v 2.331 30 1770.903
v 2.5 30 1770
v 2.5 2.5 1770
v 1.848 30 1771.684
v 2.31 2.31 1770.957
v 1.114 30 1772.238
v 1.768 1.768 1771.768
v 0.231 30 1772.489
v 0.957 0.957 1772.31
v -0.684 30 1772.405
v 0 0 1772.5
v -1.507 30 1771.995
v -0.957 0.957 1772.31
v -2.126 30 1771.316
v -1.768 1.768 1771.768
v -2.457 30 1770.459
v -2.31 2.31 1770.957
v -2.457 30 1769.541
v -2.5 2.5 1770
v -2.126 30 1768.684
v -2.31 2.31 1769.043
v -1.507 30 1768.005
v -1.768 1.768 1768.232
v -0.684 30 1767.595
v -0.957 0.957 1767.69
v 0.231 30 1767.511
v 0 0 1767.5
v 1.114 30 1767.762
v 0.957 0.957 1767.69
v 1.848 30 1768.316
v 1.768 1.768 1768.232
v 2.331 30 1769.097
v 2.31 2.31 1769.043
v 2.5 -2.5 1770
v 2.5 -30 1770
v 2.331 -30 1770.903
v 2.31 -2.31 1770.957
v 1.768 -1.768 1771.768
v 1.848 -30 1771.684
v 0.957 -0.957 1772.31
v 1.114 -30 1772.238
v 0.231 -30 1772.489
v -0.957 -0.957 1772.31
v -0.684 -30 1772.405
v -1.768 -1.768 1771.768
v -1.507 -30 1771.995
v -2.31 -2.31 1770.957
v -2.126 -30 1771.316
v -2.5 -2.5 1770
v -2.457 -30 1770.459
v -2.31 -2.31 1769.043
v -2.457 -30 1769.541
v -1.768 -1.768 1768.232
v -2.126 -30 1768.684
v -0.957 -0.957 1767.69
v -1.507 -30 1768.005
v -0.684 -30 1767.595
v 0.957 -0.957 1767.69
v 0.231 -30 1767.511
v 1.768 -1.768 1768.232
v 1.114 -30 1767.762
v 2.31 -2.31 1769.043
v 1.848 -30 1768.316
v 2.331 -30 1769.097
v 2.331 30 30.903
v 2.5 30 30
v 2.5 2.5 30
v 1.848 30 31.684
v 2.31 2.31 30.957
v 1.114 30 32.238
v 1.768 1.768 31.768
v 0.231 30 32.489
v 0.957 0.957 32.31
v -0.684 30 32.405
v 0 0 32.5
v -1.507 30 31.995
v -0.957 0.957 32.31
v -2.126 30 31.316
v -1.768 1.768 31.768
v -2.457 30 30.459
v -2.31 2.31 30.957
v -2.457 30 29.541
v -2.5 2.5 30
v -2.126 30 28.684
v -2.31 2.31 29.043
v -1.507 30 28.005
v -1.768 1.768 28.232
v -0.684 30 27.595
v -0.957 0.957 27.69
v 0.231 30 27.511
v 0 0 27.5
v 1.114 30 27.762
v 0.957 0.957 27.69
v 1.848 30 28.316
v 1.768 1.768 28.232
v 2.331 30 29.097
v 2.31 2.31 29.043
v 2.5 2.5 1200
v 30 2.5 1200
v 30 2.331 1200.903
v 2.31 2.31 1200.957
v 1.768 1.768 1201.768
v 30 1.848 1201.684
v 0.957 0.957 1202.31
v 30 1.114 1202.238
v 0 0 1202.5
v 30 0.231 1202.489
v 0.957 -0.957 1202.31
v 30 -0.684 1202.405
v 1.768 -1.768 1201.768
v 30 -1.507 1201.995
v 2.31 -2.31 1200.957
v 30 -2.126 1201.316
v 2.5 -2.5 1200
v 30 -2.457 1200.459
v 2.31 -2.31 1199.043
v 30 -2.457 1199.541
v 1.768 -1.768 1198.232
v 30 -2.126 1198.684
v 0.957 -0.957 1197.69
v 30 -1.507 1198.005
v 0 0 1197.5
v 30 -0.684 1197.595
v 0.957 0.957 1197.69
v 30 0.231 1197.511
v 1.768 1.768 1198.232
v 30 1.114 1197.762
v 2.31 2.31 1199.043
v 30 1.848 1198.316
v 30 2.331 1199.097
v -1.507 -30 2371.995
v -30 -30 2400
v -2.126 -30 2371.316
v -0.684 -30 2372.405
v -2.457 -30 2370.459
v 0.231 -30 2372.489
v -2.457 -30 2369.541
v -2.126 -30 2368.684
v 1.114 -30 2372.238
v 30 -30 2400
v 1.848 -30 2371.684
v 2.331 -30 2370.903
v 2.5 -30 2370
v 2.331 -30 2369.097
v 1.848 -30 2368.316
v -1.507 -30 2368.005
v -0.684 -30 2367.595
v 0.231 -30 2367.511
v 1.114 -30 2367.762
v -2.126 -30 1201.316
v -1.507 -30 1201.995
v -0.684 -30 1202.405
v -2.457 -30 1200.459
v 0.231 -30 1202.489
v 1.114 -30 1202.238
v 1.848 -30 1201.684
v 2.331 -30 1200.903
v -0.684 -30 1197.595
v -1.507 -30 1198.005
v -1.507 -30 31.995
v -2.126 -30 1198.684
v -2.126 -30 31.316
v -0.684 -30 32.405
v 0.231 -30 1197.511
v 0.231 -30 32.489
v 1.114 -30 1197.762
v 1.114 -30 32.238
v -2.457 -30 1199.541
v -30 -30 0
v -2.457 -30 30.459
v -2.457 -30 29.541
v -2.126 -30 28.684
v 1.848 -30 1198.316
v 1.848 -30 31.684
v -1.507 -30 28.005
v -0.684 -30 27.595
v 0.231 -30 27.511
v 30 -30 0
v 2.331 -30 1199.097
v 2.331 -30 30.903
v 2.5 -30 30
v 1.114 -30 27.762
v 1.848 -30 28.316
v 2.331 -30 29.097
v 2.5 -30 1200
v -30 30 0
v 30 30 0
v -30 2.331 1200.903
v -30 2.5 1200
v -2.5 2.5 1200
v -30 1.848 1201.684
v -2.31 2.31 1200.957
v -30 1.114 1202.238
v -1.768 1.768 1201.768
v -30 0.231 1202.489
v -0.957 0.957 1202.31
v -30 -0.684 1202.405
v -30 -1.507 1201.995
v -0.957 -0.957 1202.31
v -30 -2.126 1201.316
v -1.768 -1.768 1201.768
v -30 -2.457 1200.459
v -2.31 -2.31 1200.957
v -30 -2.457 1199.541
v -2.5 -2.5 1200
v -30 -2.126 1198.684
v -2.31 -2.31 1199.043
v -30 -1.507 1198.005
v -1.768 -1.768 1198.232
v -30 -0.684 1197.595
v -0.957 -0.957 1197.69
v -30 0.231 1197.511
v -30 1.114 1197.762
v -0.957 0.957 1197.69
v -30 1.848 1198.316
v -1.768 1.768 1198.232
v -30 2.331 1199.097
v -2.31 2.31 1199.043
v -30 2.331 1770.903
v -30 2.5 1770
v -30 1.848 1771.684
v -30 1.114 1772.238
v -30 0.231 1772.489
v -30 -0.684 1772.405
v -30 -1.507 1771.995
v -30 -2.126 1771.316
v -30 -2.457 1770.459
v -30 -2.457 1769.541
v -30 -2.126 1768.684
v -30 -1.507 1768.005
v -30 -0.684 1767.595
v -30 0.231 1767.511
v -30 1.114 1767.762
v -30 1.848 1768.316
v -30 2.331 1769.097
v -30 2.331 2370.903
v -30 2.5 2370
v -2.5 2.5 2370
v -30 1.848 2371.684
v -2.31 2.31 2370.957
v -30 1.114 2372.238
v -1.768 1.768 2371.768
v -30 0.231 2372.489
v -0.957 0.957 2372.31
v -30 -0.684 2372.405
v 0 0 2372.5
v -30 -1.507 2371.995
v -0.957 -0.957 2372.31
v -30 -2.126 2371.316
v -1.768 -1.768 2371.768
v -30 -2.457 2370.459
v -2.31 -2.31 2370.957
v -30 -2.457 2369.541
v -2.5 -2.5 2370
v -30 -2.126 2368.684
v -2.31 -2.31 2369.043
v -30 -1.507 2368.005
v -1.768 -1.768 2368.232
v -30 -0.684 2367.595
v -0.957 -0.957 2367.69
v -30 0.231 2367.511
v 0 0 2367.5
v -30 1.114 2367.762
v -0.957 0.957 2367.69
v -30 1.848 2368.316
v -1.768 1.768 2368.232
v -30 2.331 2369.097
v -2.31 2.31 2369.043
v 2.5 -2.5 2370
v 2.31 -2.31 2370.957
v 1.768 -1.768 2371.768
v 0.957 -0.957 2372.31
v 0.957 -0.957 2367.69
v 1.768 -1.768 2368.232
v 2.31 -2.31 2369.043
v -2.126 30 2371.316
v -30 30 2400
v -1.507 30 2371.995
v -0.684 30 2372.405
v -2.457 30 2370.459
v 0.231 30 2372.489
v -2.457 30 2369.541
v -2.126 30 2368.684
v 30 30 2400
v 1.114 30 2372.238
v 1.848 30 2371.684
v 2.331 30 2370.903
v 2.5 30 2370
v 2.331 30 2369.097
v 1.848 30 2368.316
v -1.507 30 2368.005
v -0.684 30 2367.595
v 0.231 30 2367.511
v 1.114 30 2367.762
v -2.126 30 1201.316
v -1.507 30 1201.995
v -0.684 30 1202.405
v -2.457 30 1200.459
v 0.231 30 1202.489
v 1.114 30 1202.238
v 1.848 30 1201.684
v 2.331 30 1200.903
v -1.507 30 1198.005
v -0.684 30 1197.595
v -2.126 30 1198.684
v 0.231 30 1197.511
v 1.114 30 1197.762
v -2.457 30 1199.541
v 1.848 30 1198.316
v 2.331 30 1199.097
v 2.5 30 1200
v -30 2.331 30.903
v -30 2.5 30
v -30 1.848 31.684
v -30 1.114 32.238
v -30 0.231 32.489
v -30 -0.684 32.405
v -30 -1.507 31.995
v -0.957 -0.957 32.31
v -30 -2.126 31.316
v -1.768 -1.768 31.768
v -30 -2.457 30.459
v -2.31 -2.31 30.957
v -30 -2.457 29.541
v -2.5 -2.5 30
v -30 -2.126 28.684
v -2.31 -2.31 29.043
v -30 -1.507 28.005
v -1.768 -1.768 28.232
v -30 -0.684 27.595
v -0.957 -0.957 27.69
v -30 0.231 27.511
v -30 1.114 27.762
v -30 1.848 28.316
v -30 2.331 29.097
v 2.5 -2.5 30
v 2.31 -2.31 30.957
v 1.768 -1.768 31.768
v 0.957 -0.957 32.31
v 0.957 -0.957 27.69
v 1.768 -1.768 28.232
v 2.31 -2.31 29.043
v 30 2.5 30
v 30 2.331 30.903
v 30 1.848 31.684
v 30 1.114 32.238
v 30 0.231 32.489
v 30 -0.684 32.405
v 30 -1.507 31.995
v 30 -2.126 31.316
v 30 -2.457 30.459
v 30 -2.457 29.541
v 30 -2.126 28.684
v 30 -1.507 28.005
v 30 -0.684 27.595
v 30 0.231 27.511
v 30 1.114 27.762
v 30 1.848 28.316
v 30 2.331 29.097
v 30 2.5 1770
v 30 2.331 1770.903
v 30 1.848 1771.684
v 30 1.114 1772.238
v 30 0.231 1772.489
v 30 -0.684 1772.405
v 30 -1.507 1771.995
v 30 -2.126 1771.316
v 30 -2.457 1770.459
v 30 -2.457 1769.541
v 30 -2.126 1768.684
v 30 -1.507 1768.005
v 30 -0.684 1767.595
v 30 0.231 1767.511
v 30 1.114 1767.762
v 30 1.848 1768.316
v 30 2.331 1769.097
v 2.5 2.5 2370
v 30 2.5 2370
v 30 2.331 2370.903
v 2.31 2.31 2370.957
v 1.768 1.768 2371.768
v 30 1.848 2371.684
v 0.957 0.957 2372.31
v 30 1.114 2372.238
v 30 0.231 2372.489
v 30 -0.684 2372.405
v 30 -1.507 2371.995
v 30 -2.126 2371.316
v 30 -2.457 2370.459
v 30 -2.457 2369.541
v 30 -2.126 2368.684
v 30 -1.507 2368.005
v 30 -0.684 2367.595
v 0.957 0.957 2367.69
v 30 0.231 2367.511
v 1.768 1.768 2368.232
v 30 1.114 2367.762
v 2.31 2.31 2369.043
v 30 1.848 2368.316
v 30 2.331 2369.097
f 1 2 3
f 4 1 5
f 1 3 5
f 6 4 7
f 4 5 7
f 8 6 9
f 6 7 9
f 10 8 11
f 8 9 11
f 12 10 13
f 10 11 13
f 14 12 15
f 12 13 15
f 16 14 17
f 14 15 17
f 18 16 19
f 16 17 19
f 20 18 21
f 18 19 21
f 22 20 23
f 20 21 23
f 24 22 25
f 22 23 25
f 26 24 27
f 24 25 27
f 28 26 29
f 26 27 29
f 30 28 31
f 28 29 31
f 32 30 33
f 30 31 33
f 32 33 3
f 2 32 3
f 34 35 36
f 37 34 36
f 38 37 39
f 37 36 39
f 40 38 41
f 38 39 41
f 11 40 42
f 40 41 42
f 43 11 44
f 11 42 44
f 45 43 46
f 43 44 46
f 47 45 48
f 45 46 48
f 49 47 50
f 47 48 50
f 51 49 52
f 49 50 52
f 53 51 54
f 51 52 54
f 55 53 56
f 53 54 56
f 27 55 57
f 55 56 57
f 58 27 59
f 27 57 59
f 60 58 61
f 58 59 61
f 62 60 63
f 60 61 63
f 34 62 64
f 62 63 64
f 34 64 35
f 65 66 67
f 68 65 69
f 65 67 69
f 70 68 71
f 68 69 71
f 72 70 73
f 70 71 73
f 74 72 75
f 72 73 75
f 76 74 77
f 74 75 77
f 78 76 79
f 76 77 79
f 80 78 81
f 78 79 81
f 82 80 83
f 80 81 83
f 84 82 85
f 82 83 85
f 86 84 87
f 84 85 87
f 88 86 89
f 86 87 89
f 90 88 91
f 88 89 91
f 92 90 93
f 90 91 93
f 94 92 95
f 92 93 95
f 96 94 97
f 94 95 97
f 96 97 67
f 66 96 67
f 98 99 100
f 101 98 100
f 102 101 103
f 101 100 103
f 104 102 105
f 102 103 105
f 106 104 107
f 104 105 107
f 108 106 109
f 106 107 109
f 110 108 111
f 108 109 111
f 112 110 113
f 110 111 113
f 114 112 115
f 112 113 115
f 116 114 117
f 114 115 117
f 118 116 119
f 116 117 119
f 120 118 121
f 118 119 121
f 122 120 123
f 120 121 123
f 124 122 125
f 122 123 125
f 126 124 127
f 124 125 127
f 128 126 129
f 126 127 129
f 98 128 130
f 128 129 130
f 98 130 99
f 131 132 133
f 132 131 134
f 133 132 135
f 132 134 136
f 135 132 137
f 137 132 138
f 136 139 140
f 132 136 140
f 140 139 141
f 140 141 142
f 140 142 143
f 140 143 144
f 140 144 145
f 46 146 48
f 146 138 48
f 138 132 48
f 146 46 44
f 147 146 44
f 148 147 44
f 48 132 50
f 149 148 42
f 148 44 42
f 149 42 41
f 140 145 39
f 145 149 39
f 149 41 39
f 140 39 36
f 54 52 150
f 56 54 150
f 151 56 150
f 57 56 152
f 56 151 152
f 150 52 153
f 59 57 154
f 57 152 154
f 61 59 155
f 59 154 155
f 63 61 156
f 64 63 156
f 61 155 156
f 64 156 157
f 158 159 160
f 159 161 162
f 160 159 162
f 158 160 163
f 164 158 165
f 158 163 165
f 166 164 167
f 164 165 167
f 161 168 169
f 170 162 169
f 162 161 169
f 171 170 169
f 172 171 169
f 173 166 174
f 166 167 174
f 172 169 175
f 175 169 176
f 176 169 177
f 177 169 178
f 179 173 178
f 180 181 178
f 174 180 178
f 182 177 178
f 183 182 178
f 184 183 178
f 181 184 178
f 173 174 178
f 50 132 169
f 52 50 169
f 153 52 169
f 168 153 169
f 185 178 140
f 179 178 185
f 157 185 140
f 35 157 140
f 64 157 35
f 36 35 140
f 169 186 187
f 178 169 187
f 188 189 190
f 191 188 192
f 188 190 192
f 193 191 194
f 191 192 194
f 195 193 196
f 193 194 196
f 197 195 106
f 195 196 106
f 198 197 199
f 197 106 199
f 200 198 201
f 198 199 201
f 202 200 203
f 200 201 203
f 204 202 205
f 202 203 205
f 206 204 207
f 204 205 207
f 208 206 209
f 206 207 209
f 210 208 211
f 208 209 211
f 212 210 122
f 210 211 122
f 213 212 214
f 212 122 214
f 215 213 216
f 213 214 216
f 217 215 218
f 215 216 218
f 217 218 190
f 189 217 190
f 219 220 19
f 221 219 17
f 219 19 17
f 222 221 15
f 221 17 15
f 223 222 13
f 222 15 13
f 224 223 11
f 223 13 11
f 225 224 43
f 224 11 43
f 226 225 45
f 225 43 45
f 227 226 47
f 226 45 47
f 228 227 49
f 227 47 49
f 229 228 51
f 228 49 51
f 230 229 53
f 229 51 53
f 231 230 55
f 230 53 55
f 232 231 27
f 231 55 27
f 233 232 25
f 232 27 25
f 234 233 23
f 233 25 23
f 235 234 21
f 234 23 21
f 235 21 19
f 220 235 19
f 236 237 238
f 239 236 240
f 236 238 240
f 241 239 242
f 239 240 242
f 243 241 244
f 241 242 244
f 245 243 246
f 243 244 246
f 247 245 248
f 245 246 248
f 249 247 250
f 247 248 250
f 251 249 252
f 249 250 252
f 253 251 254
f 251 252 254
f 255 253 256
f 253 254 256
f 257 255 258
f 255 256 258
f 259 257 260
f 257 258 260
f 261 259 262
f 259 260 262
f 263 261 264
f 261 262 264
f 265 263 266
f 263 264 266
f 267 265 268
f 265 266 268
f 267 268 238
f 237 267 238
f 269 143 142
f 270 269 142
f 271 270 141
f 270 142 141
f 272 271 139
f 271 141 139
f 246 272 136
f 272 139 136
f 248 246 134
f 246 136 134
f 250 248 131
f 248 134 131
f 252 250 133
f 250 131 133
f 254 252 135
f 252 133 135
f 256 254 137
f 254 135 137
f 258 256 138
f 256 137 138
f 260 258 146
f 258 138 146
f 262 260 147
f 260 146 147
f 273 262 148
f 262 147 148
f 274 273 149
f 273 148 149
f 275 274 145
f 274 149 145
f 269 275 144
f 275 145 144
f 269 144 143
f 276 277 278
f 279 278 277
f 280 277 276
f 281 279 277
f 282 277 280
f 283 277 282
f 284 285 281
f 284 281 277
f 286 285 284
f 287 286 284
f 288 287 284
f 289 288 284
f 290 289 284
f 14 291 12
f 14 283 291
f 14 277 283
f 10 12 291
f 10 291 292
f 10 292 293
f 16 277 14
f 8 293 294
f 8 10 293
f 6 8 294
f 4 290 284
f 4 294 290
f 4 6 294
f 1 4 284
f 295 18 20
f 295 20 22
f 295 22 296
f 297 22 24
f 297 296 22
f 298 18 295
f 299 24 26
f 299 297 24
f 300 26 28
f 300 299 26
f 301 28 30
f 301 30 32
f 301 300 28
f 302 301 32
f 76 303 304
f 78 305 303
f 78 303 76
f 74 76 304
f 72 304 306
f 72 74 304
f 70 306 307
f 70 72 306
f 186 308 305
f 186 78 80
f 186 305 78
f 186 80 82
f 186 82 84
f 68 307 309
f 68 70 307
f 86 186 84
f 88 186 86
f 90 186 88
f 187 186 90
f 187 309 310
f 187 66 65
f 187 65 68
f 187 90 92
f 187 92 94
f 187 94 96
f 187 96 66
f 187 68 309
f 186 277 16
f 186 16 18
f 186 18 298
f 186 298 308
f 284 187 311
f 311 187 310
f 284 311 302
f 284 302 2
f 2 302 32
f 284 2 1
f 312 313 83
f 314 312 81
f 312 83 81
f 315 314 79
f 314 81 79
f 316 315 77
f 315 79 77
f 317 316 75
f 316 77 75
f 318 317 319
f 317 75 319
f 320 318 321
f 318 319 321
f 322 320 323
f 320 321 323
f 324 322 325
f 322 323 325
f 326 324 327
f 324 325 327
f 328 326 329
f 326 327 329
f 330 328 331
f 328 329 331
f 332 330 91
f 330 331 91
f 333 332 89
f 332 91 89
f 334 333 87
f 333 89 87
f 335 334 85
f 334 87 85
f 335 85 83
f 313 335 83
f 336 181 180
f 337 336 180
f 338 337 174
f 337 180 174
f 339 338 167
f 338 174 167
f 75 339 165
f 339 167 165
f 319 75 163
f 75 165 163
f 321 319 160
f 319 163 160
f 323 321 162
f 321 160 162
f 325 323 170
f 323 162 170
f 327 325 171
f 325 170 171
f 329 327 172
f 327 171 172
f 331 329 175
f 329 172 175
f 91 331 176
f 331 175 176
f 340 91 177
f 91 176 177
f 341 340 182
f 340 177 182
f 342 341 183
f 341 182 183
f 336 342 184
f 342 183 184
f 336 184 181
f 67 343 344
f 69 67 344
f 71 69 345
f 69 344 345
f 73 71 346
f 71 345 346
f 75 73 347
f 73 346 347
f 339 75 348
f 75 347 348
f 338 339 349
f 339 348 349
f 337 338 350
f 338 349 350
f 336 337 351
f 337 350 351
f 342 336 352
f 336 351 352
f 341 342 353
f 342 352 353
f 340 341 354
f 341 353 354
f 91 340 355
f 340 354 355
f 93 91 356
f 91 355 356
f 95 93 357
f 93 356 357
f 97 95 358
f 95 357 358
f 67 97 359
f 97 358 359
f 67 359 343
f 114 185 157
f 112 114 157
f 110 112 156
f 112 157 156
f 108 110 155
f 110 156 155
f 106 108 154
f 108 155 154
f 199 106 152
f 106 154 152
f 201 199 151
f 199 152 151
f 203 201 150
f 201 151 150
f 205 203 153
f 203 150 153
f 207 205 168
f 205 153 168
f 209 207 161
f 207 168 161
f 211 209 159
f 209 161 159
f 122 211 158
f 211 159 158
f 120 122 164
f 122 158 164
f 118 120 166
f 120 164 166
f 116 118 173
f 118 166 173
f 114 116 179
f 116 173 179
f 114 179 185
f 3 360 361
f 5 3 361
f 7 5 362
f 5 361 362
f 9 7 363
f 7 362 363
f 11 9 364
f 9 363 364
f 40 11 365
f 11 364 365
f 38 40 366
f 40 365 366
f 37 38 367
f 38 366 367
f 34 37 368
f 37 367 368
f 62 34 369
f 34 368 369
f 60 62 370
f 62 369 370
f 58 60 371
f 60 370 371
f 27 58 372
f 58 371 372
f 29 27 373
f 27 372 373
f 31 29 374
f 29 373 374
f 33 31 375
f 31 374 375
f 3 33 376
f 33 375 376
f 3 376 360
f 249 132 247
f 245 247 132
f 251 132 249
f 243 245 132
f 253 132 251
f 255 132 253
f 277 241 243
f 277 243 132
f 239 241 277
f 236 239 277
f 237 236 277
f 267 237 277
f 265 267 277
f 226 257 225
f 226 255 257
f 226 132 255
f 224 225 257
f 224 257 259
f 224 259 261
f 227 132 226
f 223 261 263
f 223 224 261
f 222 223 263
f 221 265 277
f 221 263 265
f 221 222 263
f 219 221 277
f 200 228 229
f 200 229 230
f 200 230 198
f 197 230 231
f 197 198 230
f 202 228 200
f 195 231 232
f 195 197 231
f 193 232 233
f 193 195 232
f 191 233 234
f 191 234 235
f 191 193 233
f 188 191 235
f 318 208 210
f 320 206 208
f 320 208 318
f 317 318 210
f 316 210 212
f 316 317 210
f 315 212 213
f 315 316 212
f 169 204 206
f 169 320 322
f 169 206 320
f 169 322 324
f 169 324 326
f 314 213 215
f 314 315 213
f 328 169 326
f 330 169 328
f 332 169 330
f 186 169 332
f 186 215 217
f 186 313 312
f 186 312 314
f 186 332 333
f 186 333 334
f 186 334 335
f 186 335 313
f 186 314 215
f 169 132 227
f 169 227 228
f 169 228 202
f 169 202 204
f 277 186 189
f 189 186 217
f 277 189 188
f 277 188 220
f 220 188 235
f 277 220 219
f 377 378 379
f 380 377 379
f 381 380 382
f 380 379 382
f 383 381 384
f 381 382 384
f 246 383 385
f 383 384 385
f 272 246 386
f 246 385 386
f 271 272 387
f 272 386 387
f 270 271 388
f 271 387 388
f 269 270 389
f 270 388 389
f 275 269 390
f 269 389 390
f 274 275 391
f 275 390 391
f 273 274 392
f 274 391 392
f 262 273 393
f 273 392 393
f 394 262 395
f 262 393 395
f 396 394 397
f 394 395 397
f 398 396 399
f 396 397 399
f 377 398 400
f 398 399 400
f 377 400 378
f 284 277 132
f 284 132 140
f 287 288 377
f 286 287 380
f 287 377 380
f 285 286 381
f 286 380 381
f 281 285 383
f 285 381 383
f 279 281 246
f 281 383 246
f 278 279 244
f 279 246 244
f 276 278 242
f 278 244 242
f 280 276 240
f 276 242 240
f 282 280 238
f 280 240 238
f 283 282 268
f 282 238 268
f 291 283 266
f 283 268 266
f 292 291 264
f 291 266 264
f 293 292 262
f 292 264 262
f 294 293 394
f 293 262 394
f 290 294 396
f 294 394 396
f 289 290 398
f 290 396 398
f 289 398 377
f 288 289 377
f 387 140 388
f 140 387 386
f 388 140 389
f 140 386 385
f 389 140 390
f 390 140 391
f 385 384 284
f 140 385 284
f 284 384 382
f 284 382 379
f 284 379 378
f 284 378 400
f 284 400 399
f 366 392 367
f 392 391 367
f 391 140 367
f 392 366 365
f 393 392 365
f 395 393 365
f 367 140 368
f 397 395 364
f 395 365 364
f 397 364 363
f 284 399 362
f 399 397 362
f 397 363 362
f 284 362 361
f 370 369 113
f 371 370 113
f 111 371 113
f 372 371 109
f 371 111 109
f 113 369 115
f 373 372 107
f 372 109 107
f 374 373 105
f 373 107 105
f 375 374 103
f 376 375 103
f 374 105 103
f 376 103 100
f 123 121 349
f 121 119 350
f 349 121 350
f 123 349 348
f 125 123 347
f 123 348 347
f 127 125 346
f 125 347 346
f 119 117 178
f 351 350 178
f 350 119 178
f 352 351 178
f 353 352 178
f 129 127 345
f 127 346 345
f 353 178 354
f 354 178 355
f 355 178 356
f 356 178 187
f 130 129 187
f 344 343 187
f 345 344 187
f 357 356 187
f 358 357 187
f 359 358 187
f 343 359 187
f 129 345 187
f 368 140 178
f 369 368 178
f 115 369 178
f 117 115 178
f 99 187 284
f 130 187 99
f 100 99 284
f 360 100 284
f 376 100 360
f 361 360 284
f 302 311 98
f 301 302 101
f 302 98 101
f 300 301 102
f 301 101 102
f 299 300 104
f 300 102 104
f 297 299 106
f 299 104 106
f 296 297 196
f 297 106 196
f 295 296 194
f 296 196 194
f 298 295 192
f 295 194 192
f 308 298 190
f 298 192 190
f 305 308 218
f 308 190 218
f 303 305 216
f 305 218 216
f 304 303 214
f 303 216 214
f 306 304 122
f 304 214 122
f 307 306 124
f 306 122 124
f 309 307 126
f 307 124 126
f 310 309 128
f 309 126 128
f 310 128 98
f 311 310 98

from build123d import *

# Parameters (mm, degrees)
F1_W       = 60
F1_H       = 60
F2_DEPTH   = 2400
F5_D       = 5
F5_ON_F3_D = 5


with BuildPart() as f2:
    # F1 (on Top) → F2 (new body)
    with BuildSketch(Plane.XY):
        Rectangle(F1_W, F1_H)
    extrude(amount=F2_DEPTH)

    # F5 (through all)
    with Locations(Plane(origin=(0, 30, 0), x_dir=(-1, 0, 0), z_dir=(0, 1, 0))):
        with Locations((0, 1200), (0, 30), (0, 2370), (0, 1770)):
            Hole(F5_D / 2)

    # F5 on F3 (through all)
    with Locations(Plane(origin=(-30, 0, 0), x_dir=(0, -1, 0), z_dir=(-1, 0, 0))):
        with Locations((0, 1200), (0, 30), (0, 2370), (0, 1770)):
            Hole(F5_ON_F3_D / 2)


solid = f2.part
